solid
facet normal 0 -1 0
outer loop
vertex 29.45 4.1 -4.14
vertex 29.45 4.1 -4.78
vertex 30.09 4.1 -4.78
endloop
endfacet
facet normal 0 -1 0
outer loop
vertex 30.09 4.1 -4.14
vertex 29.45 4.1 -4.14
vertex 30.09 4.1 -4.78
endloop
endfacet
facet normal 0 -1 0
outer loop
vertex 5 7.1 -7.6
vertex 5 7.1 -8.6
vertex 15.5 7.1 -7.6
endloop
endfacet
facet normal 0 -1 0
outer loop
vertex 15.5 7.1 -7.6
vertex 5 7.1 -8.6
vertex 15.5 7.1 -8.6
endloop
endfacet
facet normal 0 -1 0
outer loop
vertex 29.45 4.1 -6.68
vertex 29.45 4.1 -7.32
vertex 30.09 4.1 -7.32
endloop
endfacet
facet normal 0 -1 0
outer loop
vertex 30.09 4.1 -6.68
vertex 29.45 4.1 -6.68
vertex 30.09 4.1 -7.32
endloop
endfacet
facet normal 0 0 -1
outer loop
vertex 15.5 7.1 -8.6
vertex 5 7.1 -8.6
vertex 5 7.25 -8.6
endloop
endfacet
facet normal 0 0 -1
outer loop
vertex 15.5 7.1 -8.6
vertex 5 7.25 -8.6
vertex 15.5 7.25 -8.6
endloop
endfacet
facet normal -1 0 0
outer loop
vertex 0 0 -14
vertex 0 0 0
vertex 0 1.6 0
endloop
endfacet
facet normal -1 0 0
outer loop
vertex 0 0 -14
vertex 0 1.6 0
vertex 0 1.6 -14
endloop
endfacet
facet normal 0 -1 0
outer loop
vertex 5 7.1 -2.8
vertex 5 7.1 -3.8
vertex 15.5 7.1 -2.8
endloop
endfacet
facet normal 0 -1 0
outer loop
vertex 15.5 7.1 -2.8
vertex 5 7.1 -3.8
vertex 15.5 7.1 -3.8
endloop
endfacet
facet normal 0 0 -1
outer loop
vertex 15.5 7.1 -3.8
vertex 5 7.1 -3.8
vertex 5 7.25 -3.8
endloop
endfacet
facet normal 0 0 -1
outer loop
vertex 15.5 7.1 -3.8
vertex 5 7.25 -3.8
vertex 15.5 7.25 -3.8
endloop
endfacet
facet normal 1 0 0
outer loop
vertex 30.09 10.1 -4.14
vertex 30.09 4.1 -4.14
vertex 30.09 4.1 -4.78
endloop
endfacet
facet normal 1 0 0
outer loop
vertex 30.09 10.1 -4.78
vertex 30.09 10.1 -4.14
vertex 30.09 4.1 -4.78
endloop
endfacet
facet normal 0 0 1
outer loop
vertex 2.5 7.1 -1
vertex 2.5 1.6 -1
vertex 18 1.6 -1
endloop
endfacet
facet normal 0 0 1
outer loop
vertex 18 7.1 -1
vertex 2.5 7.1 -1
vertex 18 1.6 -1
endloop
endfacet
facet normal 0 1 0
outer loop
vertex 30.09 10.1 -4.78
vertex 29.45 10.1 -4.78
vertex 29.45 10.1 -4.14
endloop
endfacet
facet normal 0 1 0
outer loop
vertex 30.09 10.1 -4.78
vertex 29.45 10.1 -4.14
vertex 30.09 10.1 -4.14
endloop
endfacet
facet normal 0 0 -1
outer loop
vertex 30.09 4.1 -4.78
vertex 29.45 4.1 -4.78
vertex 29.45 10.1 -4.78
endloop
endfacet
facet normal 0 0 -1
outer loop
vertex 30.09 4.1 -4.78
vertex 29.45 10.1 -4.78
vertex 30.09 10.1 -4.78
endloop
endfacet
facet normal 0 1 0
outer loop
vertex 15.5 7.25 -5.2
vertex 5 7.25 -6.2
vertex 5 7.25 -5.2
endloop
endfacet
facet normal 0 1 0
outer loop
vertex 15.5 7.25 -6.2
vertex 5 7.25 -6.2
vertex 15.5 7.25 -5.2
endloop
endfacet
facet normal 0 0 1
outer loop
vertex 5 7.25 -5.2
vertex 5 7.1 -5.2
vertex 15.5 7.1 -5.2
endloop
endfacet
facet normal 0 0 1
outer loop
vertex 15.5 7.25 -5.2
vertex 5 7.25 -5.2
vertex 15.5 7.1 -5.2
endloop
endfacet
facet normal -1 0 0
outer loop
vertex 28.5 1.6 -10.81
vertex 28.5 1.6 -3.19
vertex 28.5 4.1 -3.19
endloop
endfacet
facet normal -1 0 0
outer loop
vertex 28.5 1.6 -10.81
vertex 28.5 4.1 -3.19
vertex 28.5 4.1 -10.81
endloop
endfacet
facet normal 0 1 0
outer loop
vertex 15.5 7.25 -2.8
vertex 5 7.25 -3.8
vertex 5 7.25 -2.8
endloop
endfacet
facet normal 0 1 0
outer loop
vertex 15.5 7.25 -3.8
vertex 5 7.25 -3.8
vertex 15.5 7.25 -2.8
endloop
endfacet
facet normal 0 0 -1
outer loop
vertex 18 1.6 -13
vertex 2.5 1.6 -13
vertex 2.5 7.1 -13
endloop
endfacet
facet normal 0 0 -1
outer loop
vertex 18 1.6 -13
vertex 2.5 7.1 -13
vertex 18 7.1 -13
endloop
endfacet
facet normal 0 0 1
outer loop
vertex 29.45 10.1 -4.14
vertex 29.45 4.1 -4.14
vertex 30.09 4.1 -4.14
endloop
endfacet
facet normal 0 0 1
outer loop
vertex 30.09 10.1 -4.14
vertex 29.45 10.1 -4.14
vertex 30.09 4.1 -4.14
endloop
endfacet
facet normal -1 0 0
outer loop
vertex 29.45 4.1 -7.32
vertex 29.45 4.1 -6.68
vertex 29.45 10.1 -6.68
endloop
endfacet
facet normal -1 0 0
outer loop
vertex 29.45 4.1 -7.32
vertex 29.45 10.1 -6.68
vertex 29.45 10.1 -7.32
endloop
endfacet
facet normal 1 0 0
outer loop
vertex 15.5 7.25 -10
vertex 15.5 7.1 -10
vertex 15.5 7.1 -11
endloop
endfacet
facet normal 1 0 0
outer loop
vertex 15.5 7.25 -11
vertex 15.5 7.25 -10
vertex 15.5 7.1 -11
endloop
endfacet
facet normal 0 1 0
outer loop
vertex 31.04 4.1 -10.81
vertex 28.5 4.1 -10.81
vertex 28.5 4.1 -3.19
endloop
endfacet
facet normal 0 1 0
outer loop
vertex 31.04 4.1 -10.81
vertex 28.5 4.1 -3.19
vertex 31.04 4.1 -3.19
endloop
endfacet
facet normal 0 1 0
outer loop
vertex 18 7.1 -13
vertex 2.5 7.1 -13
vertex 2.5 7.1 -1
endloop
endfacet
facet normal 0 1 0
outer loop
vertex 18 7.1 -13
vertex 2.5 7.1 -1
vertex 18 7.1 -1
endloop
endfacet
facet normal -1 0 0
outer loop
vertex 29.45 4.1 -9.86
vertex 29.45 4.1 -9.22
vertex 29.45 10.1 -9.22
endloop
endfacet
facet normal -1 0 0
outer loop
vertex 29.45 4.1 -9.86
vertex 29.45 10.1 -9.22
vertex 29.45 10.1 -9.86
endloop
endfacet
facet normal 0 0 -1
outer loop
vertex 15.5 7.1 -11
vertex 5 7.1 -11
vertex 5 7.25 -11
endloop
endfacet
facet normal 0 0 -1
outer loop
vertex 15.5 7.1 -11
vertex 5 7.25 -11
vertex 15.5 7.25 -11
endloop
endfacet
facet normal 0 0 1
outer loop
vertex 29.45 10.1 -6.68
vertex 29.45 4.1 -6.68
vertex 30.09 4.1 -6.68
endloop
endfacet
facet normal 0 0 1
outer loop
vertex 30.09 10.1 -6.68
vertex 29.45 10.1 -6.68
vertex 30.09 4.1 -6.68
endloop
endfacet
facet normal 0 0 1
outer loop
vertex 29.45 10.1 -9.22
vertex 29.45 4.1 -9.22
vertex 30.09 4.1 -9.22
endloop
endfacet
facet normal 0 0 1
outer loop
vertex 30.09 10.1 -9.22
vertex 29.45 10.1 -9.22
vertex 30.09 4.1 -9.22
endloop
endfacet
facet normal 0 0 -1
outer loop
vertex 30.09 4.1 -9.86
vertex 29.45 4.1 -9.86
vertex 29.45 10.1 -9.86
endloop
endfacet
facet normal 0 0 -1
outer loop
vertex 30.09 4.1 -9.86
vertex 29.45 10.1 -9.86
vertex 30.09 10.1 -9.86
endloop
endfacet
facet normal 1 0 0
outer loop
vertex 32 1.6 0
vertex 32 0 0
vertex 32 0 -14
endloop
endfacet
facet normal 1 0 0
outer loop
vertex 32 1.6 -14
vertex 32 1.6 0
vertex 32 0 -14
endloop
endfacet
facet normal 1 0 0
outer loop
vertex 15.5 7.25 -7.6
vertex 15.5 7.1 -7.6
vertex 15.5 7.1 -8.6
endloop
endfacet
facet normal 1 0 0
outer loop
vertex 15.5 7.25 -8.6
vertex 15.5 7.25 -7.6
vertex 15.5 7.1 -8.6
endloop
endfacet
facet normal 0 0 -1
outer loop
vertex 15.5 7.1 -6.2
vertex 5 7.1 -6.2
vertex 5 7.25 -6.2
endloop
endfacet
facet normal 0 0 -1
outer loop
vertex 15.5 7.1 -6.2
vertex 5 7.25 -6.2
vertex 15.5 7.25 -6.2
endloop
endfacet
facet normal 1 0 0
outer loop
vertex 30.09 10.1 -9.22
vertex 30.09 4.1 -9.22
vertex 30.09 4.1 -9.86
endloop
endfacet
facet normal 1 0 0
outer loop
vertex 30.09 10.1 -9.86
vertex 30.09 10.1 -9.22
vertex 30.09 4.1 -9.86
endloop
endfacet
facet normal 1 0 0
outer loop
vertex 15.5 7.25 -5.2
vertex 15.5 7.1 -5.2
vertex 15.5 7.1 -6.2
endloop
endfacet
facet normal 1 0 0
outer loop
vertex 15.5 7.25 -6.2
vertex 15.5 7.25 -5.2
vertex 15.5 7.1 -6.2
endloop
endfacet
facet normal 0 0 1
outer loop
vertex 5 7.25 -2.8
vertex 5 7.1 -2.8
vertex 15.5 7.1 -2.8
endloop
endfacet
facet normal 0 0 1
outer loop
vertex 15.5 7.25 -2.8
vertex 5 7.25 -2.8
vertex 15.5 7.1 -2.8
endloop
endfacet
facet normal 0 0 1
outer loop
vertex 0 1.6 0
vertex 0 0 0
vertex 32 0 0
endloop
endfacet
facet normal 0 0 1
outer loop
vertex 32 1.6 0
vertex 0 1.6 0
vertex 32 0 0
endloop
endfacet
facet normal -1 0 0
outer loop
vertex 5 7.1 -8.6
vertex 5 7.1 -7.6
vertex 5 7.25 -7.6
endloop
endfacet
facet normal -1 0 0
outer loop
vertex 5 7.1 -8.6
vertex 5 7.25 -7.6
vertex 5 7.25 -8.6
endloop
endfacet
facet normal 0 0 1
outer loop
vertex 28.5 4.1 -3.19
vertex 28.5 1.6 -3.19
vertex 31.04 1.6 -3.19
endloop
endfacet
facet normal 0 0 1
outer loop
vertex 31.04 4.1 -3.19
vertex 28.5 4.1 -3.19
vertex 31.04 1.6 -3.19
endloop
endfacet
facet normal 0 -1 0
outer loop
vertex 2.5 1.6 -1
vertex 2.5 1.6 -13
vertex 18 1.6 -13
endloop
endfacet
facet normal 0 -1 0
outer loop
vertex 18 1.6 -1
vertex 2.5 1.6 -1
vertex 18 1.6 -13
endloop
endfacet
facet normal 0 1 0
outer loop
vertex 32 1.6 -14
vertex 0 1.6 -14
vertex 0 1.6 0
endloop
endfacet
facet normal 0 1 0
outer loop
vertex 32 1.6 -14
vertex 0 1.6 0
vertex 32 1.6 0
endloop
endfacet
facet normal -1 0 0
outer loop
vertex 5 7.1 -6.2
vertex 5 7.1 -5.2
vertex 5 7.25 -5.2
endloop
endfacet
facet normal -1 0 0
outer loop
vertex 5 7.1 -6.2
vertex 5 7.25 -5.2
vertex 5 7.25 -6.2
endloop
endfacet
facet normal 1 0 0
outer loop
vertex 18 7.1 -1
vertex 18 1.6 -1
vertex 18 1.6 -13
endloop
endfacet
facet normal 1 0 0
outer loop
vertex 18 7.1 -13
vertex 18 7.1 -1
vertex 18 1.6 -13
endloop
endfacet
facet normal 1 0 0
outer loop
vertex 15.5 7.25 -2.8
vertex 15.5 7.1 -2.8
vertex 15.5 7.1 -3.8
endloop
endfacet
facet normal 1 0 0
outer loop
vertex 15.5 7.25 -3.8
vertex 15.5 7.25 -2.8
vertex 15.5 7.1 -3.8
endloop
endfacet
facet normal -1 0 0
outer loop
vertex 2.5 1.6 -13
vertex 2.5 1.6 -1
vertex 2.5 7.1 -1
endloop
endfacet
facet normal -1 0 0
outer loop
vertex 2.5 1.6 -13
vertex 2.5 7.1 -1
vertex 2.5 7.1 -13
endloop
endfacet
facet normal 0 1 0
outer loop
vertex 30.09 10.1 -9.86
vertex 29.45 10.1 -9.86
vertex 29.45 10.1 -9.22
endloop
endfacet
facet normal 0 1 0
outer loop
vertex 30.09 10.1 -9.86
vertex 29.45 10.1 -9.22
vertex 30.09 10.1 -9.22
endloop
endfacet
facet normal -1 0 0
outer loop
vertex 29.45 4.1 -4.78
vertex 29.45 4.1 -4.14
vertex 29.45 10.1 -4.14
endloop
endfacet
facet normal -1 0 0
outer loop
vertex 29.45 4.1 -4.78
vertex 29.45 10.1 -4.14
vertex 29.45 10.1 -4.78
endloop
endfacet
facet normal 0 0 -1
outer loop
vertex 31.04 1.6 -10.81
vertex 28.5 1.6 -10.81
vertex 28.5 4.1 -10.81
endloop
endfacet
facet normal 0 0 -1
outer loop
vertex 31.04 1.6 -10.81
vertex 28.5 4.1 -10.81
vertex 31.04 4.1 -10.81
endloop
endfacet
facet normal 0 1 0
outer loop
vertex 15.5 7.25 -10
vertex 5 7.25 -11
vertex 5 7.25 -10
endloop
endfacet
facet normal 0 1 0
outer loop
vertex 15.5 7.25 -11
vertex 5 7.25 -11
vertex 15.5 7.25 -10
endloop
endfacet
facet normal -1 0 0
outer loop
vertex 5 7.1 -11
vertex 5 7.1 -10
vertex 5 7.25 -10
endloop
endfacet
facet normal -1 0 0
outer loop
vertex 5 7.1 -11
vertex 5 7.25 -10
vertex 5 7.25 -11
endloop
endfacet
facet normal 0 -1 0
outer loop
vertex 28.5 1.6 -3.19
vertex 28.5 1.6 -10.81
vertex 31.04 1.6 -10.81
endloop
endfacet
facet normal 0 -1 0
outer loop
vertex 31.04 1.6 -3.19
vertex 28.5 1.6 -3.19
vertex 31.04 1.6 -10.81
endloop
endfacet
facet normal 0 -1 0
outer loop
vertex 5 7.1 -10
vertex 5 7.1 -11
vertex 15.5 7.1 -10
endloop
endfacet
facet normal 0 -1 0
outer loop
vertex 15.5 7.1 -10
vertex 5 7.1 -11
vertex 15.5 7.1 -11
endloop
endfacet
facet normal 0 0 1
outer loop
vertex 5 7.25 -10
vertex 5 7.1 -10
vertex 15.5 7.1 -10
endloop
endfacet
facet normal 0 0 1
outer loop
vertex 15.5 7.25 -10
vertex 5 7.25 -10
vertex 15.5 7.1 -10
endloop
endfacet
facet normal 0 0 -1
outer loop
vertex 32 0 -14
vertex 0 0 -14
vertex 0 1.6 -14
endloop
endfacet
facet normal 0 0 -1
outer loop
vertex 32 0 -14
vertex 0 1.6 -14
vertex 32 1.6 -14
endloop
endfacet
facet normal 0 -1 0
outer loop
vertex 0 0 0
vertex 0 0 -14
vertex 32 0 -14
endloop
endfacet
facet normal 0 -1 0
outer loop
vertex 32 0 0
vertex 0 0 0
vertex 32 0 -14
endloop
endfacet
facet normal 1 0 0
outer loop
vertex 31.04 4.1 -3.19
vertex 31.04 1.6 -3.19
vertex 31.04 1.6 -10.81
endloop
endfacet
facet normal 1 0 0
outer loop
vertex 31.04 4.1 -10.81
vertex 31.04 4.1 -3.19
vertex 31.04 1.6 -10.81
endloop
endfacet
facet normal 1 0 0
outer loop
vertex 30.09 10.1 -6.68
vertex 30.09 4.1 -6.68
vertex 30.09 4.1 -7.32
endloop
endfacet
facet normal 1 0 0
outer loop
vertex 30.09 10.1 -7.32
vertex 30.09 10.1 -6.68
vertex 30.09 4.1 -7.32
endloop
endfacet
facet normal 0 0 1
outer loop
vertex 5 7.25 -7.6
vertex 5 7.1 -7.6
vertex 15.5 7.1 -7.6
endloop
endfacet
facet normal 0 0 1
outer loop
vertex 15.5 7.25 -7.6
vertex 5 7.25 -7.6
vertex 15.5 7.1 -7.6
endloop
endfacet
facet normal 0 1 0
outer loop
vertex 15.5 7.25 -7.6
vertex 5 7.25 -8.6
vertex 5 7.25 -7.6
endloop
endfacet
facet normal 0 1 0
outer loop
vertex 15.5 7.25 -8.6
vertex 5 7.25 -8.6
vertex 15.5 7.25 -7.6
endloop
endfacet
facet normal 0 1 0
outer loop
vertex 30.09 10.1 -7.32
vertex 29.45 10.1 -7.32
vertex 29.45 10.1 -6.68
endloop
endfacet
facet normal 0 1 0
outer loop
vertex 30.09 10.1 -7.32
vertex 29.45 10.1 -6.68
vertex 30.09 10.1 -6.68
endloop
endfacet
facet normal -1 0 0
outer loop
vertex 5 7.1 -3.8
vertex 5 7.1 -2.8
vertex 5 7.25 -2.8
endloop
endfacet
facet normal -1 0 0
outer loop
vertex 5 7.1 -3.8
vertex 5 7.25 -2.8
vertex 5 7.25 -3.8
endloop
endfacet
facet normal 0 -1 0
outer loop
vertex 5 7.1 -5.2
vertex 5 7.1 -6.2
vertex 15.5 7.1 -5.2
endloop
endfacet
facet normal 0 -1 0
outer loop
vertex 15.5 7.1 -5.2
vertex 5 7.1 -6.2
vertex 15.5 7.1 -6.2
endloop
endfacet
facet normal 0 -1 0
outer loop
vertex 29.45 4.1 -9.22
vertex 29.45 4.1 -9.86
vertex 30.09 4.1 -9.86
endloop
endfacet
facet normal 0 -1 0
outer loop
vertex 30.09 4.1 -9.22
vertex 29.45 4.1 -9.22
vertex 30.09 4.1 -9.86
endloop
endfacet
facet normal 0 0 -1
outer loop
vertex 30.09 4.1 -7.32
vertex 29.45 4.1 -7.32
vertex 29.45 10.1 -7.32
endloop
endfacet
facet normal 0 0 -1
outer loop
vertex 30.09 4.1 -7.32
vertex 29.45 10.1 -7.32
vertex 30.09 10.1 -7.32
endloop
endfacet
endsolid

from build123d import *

# Parameters (mm, degrees)
SK_PCB_W            = 32
SK_PCB_H            = 14
PCB_DEPTH           = 1.6
DHT11_START         = 1.6
SK_DHT11_HOUSING_W  = 15.5
SK_DHT11_HOUSING_H  = 12
DHT11_HOUSING_DEPTH = 5.5
GRILLE_START        = 7.1
SK_GRILLE_W         = 10.5
SK_GRILLE_H         = 1
GRILLE_DEPTH        = 0.15
GRILLE_2_DEPTH      = 0.15
GRILLE_3_DEPTH      = 0.15
GRILLE_4_DEPTH      = 0.15
HEADER_START        = 1.6
SK_HEADER_3_PIN_W   = 2.54
SK_HEADER_3_PIN_H   = 7.62
HEADER_3_PIN_DEPTH  = 2.5
HEADER_START_2      = 4.1
SK_HEADER_PINS_W    = 0.64
SK_HEADER_PINS_H    = 0.64
HEADER_PINS_DEPTH   = 6
HEADER_PINS_2_DEPTH = 6
HEADER_PINS_3_DEPTH = 6


with BuildPart() as part:
    # SK PCB → PCB (new body)
    with BuildSketch(Plane(origin=(0, 0, 0), x_dir=(1, 0, 0), z_dir=(0, 1, 0))):
        with Locations((16, 7)):
            Rectangle(SK_PCB_W, SK_PCB_H)
    extrude(amount=PCB_DEPTH)


with BuildPart() as body_2:
    # SK DHT11 housing → DHT11 housing (new body)
    with BuildSketch(Plane(origin=(0, 0, 0), x_dir=(1, 0, 0), z_dir=(0, 1, 0)).offset(DHT11_START)):
        with Locations((10.25, 7)):
            Rectangle(SK_DHT11_HOUSING_W, SK_DHT11_HOUSING_H)
    extrude(amount=DHT11_HOUSING_DEPTH)


with BuildPart() as body_3:
    # SK Grille → Grille (new body)
    with BuildSketch(Plane(origin=(0, 0, 0), x_dir=(1, 0, 0), z_dir=(0, 1, 0)).offset(GRILLE_START)):
        with Locations((10.25, 10.5)):
            Rectangle(SK_GRILLE_W, SK_GRILLE_H)
    extrude(amount=GRILLE_DEPTH)


with BuildPart() as body_4:
    # SK Grille → Grille 2 (new body)
    with BuildSketch(Plane(origin=(0, 0, 0), x_dir=(1, 0, 0), z_dir=(0, 1, 0)).offset(GRILLE_START)):
        with Locations((10.25, 8.1)):
            Rectangle(SK_GRILLE_W, SK_GRILLE_H)
    extrude(amount=GRILLE_2_DEPTH)


with BuildPart() as body_5:
    # SK Grille → Grille 3 (new body)
    with BuildSketch(Plane(origin=(0, 0, 0), x_dir=(1, 0, 0), z_dir=(0, 1, 0)).offset(GRILLE_START)):
        with Locations((10.25, 5.7)):
            Rectangle(SK_GRILLE_W, SK_GRILLE_H)
    extrude(amount=GRILLE_3_DEPTH)


with BuildPart() as body_6:
    # SK Grille → Grille 4 (new body)
    with BuildSketch(Plane(origin=(0, 0, 0), x_dir=(1, 0, 0), z_dir=(0, 1, 0)).offset(GRILLE_START)):
        with Locations((10.25, 3.3)):
            Rectangle(SK_GRILLE_W, SK_GRILLE_H)
    extrude(amount=GRILLE_4_DEPTH)


with BuildPart() as body_7:
    # SK Header 3 pin → Header 3 pin (new body)
    with BuildSketch(Plane(origin=(0, 0, 0), x_dir=(1, 0, 0), z_dir=(0, 1, 0)).offset(HEADER_START)):
        with Locations((29.77, 7)):
            Rectangle(SK_HEADER_3_PIN_W, SK_HEADER_3_PIN_H)
    extrude(amount=HEADER_3_PIN_DEPTH)


with BuildPart() as body_8:
    # SK Header pins → Header pins (new body)
    with BuildSketch(Plane(origin=(0, 0, 0), x_dir=(1, 0, 0), z_dir=(0, 1, 0)).offset(HEADER_START_2)):
        with Locations((29.77, 9.54)):
            Rectangle(SK_HEADER_PINS_W, SK_HEADER_PINS_H)
    extrude(amount=HEADER_PINS_DEPTH)


with BuildPart() as body_9:
    # SK Header pins → Header pins 2 (new body)
    with BuildSketch(Plane(origin=(0, 0, 0), x_dir=(1, 0, 0), z_dir=(0, 1, 0)).offset(HEADER_START_2)):
        with Locations((29.77, 7)):
            Rectangle(SK_HEADER_PINS_W, SK_HEADER_PINS_H)
    extrude(amount=HEADER_PINS_2_DEPTH)


with BuildPart() as body_10:
    # SK Header pins → Header pins 3 (new body)
    with BuildSketch(Plane(origin=(0, 0, 0), x_dir=(1, 0, 0), z_dir=(0, 1, 0)).offset(HEADER_START_2)):
        with Locations((29.77, 4.46)):
            Rectangle(SK_HEADER_PINS_W, SK_HEADER_PINS_H)
    extrude(amount=HEADER_PINS_3_DEPTH)


solid = Compound([part.part, body_2.part, body_3.part, body_4.part, body_5.part, body_6.part, body_7.part, body_8.part, body_9.part, body_10.part])
